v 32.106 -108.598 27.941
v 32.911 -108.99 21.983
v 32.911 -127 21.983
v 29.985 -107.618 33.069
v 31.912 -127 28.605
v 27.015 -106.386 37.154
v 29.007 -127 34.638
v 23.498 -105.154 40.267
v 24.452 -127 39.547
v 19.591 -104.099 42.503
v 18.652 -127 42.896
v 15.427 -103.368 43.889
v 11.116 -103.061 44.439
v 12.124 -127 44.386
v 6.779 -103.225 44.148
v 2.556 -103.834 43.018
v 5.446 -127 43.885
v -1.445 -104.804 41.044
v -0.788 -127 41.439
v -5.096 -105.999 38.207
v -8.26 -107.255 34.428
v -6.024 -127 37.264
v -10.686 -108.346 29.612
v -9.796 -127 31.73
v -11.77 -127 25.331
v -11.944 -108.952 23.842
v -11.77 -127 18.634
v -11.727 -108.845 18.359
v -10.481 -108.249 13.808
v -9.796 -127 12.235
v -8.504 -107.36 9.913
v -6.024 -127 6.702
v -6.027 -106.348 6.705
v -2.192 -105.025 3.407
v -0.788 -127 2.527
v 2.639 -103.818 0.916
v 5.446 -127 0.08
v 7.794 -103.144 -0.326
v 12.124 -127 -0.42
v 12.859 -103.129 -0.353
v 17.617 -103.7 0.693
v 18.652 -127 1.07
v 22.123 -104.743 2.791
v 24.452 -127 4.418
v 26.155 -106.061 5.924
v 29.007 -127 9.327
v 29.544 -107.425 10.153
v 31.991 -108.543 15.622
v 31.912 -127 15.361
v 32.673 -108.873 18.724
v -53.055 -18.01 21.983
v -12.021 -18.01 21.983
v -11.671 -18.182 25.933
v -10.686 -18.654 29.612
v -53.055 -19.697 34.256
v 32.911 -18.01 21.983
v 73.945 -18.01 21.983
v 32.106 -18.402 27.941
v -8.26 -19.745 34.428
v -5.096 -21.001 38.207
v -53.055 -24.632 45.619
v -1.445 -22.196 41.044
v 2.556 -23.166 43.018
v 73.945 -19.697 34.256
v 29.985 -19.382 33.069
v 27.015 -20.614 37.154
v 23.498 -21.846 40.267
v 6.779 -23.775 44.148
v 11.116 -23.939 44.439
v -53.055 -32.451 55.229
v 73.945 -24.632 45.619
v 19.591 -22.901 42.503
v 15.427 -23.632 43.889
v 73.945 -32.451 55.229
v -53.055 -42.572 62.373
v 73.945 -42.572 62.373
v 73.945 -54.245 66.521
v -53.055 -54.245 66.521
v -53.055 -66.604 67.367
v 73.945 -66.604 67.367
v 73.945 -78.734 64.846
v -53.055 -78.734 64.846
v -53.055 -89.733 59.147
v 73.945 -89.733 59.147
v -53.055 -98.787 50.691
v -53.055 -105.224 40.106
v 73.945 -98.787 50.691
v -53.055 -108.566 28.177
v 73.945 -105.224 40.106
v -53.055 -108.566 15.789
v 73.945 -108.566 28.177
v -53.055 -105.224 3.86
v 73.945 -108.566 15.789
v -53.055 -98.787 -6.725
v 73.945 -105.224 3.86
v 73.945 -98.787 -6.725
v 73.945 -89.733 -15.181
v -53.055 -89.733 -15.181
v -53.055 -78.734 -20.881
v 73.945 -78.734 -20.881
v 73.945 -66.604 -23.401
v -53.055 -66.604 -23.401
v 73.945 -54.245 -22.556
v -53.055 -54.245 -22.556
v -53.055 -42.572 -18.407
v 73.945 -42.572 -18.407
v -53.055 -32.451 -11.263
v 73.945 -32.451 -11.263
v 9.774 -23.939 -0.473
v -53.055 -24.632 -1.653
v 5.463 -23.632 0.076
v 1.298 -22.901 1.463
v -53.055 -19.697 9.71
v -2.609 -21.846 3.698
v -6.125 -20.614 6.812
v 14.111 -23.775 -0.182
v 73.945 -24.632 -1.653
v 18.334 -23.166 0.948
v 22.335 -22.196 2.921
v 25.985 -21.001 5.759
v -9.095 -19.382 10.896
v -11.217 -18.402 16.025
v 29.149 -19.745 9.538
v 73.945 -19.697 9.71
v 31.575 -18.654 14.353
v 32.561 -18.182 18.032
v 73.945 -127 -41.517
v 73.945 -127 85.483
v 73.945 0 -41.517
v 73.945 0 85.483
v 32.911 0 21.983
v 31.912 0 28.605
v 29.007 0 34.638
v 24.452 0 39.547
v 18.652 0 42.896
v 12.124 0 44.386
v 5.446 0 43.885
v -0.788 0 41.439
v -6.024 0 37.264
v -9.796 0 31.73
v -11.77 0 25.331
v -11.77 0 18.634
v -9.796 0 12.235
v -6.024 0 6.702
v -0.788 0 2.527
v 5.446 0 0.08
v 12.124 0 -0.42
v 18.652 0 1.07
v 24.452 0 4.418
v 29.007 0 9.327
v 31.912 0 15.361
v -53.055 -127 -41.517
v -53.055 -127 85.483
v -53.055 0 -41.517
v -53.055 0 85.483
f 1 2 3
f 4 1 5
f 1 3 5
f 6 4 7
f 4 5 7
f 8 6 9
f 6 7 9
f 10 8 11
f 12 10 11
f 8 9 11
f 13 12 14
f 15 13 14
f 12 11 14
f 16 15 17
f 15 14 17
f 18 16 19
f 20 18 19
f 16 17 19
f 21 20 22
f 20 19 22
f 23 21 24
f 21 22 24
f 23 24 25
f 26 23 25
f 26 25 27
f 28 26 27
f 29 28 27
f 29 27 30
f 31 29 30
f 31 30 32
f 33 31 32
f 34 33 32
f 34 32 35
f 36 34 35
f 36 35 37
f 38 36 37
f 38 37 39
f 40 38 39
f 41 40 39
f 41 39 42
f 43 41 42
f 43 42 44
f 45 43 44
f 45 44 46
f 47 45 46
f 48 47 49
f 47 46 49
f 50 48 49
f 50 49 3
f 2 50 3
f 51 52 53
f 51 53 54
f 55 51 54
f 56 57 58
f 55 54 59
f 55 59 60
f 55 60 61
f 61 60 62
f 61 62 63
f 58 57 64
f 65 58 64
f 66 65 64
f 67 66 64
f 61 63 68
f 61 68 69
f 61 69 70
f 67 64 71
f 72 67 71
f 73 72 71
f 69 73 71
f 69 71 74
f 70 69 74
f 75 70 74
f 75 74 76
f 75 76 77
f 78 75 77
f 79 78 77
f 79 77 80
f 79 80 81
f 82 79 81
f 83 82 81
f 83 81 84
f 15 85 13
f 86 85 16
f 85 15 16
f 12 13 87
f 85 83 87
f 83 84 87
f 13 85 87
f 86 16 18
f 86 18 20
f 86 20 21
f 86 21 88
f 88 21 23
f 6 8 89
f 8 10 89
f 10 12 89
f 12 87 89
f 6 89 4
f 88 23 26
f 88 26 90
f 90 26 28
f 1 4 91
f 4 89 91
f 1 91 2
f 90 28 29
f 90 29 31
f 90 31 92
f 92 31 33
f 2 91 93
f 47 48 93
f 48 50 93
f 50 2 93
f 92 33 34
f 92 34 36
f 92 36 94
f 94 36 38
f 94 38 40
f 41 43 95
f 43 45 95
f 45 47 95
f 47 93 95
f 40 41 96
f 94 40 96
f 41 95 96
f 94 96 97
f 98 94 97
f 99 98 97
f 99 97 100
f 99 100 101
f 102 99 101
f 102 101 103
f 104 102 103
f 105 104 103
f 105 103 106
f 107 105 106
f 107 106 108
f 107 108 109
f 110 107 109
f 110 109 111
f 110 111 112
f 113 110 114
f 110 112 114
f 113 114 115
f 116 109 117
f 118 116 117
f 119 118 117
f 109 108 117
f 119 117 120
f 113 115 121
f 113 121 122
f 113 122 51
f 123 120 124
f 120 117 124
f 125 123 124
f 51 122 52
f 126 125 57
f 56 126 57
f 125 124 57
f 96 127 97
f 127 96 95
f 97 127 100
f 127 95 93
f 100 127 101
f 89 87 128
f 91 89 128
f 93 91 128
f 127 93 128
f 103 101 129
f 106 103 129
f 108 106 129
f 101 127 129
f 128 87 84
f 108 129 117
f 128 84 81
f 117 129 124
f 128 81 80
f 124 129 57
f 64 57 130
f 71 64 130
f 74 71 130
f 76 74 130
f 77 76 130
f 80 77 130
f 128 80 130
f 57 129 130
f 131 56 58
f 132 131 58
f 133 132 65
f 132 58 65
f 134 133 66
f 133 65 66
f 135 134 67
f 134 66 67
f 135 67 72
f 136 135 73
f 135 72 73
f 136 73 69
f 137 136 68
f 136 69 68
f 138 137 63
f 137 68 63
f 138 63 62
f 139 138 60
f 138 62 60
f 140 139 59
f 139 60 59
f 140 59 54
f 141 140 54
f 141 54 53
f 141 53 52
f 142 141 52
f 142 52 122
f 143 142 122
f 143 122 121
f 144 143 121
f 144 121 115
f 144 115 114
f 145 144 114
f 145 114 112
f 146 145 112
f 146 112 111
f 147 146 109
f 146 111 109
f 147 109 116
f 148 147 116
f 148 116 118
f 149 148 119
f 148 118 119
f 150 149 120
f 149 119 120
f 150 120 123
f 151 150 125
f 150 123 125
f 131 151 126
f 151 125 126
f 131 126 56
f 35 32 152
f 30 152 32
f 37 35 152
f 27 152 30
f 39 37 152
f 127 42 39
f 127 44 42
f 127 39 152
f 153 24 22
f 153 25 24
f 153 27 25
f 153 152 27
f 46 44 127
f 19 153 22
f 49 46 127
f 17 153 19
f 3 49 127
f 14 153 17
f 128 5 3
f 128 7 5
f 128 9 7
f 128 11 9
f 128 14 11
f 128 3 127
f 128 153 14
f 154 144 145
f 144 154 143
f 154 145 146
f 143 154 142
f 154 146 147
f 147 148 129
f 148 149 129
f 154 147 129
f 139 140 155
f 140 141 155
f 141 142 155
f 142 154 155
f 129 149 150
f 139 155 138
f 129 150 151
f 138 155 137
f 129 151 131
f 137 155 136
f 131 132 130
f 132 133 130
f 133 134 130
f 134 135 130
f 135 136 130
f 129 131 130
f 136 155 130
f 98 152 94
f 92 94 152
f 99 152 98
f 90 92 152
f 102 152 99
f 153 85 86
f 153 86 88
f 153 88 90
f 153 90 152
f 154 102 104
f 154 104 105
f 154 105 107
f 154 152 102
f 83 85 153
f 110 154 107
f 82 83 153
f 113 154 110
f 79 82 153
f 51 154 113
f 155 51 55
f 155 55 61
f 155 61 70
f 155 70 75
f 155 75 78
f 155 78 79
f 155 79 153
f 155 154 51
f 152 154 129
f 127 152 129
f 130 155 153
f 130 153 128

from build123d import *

# Parameters (mm, degrees)
F0_W     = 127
F0_H     = 127
F1_DEPTH = 127
F2_R     = 22.465929
F3_DEPTH = 145.034
F4_R     = 45.490035
F5_DEPTH = 141.478


with BuildPart() as f1:
    # F0 (on Front) → F1 (new body)
    with BuildSketch(Plane.XZ):
        with Locations((10.444654, 21.982812)):
            Rectangle(F0_W, F0_H)
    extrude(amount=F1_DEPTH)

    # F2 (on face) → F3 (cut)
    with BuildSketch(Plane.XZ.offset(127)):
        with Locations((10.444654, 21.982812)):
            Circle(F2_R)
    extrude(amount=-F3_DEPTH, mode=Mode.SUBTRACT)

    # F4 (on face) → F5 (cut)
    with BuildSketch(Plane.YZ.offset(73.944654)):
        with Locations((-63.5, 21.982812)):
            Circle(F4_R)
    extrude(amount=-F5_DEPTH, mode=Mode.SUBTRACT)


solid = f1.part
